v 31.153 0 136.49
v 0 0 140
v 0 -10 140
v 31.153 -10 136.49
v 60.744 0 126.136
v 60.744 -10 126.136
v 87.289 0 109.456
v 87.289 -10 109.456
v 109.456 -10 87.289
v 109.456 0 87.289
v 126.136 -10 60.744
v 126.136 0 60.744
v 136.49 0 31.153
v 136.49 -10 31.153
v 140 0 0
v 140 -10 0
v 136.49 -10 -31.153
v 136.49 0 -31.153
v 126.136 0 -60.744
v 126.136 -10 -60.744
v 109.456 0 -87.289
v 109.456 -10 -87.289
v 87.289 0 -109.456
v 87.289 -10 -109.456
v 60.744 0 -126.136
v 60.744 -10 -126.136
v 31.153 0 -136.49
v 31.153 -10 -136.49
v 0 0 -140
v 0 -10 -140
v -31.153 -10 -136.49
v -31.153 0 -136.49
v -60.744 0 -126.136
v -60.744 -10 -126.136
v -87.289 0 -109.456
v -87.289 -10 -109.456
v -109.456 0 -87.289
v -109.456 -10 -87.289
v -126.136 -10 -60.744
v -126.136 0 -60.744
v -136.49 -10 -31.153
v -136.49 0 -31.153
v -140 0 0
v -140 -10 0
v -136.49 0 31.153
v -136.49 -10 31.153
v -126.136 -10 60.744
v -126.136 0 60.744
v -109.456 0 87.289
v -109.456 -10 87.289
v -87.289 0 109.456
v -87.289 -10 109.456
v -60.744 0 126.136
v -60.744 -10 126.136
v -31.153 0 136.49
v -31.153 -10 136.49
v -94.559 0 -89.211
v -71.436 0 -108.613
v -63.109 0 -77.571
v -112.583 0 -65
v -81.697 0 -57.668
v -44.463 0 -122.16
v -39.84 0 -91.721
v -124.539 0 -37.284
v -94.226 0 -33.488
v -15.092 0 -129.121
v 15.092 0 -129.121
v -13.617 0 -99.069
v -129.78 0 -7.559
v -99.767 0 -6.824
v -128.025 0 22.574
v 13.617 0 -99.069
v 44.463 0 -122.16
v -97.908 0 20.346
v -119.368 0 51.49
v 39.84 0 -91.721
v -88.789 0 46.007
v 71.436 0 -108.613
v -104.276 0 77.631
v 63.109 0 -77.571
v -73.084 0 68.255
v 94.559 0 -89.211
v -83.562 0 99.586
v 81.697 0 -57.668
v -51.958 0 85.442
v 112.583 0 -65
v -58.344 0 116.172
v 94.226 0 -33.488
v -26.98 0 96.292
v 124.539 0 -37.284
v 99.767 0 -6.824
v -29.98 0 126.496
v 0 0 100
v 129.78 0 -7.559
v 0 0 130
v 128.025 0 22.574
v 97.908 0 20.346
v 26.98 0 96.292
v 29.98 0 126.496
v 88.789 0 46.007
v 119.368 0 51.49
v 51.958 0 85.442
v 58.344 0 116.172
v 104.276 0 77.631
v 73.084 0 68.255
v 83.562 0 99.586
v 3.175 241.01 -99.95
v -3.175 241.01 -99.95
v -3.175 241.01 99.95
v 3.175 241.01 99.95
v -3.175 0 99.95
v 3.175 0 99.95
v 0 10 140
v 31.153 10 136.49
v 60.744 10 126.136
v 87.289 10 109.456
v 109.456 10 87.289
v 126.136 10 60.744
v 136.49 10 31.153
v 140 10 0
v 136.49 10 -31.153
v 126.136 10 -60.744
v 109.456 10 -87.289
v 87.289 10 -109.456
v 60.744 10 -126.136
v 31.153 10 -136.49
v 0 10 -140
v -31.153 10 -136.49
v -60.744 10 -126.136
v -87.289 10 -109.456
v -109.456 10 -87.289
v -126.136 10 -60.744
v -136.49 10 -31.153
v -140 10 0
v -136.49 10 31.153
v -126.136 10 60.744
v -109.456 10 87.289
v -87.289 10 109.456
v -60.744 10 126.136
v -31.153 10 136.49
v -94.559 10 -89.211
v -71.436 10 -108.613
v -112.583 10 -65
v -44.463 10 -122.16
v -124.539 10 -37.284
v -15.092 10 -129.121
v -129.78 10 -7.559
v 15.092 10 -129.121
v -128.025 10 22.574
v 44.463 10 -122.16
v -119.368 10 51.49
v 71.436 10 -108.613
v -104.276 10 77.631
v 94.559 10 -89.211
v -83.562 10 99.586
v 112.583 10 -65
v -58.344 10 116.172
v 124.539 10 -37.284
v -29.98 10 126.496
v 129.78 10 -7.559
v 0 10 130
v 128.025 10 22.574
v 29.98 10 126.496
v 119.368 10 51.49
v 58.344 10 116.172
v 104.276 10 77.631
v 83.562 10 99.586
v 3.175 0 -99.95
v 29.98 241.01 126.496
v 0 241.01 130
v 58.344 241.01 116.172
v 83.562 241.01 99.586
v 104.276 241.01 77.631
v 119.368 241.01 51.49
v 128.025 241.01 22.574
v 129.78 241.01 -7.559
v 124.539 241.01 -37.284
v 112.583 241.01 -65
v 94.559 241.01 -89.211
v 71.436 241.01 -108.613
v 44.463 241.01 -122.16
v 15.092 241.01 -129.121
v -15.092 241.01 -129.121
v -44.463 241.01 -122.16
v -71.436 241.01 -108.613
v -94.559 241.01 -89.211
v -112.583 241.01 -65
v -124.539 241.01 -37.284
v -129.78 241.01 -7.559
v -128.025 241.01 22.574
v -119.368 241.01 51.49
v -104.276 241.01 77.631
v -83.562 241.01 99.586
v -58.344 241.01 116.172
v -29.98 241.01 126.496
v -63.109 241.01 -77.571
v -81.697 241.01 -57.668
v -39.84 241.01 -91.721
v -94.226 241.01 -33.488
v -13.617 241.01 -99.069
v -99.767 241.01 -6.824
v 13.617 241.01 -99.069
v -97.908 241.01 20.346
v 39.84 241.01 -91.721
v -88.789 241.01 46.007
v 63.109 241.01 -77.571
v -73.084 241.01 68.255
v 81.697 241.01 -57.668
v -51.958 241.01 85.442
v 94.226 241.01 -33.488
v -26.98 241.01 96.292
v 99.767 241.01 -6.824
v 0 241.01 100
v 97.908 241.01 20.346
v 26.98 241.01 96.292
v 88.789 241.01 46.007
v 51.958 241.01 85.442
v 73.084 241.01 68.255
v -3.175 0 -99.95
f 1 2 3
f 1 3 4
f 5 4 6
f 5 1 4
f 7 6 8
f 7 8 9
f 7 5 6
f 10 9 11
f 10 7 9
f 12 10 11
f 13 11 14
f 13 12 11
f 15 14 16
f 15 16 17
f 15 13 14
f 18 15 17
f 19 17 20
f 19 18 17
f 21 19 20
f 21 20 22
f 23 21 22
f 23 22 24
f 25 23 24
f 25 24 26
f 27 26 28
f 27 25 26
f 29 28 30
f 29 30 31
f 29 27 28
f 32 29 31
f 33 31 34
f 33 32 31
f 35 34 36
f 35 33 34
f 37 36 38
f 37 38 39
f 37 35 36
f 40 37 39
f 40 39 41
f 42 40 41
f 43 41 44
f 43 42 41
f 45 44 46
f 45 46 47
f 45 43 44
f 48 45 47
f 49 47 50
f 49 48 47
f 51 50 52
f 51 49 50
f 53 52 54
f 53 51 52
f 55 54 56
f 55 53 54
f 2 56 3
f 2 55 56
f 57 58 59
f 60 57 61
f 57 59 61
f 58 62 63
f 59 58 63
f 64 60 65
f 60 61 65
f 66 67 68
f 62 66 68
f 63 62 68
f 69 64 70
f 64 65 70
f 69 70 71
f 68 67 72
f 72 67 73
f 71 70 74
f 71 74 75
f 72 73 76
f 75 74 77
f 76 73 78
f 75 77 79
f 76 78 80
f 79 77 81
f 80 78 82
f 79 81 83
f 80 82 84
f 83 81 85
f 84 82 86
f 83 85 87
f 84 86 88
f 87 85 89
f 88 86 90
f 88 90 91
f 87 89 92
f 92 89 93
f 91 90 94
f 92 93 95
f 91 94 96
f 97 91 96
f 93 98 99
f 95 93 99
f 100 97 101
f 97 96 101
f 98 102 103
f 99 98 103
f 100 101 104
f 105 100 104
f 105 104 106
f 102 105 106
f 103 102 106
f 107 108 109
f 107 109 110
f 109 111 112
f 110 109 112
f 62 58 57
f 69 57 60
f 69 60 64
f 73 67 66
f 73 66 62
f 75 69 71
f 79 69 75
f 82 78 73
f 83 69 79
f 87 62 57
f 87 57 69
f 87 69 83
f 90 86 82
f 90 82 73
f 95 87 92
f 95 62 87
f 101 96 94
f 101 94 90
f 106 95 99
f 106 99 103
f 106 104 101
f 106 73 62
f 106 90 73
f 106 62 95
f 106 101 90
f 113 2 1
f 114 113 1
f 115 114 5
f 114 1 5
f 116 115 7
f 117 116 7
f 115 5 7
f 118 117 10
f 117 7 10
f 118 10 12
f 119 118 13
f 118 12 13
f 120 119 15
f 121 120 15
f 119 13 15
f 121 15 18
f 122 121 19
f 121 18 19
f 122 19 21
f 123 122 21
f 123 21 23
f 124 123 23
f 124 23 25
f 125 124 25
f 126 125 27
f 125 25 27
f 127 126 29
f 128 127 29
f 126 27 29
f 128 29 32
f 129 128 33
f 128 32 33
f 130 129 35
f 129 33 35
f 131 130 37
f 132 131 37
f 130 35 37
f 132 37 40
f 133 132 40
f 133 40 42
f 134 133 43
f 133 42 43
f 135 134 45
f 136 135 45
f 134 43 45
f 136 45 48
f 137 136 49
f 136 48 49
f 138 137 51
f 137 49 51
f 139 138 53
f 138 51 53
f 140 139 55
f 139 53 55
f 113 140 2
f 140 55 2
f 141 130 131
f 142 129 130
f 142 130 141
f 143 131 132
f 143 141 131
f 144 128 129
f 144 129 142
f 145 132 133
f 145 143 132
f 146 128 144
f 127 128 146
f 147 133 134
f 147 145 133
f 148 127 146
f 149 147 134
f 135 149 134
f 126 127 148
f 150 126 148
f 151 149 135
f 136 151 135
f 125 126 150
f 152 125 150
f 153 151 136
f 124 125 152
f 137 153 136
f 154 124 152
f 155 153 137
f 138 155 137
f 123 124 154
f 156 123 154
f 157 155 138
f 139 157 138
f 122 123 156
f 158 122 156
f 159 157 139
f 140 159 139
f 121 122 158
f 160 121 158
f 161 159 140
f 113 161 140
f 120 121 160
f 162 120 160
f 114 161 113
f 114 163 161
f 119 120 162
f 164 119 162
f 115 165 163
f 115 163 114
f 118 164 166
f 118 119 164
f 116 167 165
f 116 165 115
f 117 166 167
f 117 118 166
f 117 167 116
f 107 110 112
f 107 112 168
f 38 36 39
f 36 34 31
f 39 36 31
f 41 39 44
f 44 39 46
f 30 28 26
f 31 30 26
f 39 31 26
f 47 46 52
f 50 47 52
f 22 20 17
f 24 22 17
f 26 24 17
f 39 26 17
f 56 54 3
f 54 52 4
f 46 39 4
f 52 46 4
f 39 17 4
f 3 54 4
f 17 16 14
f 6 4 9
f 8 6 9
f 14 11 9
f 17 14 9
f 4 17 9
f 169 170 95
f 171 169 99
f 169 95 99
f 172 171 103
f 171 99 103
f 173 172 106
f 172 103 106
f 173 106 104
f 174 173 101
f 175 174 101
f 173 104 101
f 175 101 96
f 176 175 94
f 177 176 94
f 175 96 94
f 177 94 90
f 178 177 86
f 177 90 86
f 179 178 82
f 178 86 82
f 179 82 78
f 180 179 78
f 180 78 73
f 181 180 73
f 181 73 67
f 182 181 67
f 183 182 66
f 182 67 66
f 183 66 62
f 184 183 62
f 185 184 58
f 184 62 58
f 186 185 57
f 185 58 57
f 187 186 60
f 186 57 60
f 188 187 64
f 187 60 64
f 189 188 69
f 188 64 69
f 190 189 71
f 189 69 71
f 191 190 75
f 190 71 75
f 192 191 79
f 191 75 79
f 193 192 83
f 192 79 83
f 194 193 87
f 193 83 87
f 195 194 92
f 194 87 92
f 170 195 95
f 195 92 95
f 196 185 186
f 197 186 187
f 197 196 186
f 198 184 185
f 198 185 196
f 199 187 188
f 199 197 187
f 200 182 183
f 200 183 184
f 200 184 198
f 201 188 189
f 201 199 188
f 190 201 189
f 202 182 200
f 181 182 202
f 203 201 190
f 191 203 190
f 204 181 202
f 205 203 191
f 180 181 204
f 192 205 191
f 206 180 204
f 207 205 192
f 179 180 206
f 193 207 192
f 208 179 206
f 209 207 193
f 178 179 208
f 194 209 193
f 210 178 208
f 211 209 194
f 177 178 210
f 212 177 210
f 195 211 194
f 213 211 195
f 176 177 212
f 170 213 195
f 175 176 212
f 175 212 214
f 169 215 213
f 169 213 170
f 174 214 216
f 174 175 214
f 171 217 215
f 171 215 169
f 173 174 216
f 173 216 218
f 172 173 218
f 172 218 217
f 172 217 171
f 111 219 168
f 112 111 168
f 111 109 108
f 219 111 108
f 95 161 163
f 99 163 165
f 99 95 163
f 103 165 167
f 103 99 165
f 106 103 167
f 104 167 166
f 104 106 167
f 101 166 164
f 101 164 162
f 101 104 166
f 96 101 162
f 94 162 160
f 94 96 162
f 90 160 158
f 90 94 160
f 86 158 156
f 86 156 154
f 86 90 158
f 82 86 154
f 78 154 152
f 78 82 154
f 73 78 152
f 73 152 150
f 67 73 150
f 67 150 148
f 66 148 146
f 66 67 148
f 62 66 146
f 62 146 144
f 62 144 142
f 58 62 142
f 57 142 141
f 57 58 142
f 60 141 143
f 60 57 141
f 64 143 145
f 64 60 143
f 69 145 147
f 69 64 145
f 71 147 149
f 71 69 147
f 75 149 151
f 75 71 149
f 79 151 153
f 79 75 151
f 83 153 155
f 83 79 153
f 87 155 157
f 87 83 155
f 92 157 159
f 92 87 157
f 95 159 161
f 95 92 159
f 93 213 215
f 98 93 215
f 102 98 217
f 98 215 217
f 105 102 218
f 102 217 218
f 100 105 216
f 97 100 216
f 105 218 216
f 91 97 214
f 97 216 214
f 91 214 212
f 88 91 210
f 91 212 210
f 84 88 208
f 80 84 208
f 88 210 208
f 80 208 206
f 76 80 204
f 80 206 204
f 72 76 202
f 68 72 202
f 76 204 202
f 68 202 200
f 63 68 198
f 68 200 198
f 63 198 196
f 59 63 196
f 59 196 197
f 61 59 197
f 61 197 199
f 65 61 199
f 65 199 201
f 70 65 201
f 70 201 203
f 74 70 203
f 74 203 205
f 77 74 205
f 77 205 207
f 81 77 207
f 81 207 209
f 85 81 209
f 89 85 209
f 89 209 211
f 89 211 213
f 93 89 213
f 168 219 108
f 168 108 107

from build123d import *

# Parameters (mm, degrees)
SKETCH1_R            = 130
BOSS_EXTRUDE1_DEPTH  = 241.01
SKETCH2_R            = 100
CUT_EXTRUDE1_DEPTH   = 304.126739335
SKETCH5_W            = 6.35
SKETCH5_H            = 199.899168332
BOSS_EXTRUDE2_DEPTH  = 241.01
SKETCH6_R            = 140
BOSS_EXTRUDE8_DEPTH  = 10
SKETCH8_R            = 140
SKETCH8_R_2          = 130
BOSS_EXTRUDE10_DEPTH = 10


with BuildPart() as part:
    # Sketch1 → Boss-Extrude1 (new body)
    with BuildSketch(Plane(origin=(0, 0, 0), x_dir=(1, 0, 0), z_dir=(0, 1, 0))):
        Circle(SKETCH1_R)
    extrude(amount=BOSS_EXTRUDE1_DEPTH)

    # Sketch2 → Cut-Extrude1 (cut, through all)
    with BuildSketch(Plane(origin=(0, 241.01, 0), x_dir=(1, 0, 0), z_dir=(0, 1, 0))):
        Circle(SKETCH2_R)
    extrude(amount=-CUT_EXTRUDE1_DEPTH, mode=Mode.SUBTRACT)


with BuildPart() as body_2:
    # Sketch5 → Boss-Extrude2 (new body)
    with BuildSketch(Plane(origin=(0, 0, 0), x_dir=(1, 0, 0), z_dir=(0, 1, 0))):
        Rectangle(SKETCH5_W, SKETCH5_H)
    extrude(amount=BOSS_EXTRUDE2_DEPTH)


with BuildPart() as body_3:
    # Sketch6 → Boss-Extrude8 (new body)
    with BuildSketch(Plane(origin=(0, 0, 0), x_dir=(1, 0, 0), z_dir=(0, 1, 0))):
        Circle(SKETCH6_R)
    extrude(amount=-BOSS_EXTRUDE8_DEPTH)


with BuildPart() as body_4:
    # Sketch8 → Boss-Extrude10 (new body)
    with BuildSketch(Plane(origin=(0, 0, 0), x_dir=(1, 0, 0), z_dir=(0, 1, 0))):
        Circle(SKETCH8_R)
        Circle(SKETCH8_R_2, mode=Mode.SUBTRACT)
    extrude(amount=BOSS_EXTRUDE10_DEPTH)


with BuildPart() as body_3_1:
    add(body_3.part)

    # Combine1: union body 4
    add(body_4.part)


solid = Compound([part.part, body_2.part, body_3_1.part])
